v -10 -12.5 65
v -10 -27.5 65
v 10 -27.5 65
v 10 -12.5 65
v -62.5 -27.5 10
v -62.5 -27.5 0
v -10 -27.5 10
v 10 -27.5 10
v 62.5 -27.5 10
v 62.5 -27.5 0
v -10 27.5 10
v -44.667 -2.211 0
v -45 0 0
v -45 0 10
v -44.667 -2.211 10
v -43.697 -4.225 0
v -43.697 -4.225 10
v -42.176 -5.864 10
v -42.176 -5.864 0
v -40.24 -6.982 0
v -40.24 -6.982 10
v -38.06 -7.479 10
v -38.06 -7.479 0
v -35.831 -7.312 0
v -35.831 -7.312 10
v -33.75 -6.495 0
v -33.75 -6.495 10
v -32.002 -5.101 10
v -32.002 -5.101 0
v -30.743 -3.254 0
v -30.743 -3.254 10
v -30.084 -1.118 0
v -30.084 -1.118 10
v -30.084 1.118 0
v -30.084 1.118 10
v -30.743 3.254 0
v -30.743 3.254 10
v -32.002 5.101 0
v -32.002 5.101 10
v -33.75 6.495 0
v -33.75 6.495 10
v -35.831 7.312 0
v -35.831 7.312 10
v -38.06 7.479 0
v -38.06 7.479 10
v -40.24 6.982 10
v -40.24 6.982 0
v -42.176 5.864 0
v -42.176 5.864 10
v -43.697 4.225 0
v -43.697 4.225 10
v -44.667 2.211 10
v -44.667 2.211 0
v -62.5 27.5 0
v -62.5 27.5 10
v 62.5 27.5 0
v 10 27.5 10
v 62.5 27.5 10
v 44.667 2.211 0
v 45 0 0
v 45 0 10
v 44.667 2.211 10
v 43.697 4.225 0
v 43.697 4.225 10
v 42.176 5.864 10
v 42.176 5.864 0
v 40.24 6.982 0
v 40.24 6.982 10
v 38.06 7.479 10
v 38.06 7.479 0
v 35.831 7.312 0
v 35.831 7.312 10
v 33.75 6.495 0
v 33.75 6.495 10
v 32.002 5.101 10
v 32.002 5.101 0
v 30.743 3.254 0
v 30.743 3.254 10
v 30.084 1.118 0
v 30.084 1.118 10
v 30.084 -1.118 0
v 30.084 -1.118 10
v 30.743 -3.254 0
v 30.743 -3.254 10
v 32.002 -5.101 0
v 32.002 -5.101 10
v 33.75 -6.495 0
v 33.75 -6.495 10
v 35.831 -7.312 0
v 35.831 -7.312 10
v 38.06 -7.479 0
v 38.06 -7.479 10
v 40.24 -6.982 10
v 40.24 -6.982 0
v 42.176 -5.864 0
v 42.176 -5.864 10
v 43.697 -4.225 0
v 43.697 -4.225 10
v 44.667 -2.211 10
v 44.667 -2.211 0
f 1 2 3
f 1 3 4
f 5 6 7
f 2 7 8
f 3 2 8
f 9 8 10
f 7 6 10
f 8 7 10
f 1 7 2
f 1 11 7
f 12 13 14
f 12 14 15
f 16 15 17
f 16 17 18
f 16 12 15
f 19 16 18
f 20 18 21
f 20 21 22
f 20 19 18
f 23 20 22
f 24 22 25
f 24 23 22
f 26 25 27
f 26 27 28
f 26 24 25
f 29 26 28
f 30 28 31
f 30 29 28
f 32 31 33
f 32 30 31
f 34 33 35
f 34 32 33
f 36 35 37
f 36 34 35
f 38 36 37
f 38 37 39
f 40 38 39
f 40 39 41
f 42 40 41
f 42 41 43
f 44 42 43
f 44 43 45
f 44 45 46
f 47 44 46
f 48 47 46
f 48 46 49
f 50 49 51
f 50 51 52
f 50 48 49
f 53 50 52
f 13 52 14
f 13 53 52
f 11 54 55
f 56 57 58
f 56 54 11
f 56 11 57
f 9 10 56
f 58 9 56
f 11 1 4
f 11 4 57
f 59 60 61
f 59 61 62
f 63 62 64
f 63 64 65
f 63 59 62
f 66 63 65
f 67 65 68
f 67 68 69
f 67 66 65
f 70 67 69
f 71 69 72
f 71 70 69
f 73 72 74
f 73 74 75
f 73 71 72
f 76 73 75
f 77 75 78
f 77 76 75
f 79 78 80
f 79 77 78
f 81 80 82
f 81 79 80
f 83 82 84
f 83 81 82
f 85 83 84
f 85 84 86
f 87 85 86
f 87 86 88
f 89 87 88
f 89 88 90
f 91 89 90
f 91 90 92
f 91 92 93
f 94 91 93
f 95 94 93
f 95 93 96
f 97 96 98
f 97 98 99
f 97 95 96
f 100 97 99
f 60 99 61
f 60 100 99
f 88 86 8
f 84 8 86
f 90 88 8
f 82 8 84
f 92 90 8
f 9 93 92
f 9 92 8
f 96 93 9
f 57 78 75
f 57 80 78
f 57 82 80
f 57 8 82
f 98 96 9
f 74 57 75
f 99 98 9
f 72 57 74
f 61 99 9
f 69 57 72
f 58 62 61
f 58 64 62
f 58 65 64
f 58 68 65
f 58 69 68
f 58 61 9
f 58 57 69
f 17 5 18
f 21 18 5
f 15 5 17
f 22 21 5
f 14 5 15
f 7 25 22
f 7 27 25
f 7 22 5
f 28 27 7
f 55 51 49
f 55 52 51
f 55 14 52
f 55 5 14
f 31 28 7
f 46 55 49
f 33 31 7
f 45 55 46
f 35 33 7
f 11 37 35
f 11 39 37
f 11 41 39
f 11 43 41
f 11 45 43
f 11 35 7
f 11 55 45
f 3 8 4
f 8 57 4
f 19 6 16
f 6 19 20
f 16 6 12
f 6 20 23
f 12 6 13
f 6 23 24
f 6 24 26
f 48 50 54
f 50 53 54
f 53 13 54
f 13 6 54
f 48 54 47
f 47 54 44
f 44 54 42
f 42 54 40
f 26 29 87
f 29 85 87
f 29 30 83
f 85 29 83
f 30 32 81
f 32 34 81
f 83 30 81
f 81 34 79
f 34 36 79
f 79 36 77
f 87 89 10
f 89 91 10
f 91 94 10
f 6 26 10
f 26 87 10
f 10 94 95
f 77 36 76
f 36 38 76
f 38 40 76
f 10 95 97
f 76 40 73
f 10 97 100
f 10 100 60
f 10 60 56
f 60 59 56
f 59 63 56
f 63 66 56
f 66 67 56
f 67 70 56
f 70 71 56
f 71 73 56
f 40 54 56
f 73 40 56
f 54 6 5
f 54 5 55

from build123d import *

# Parameters (mm, degrees)
SKETCH1_W                = 125
SKETCH1_H                = 55
SKETCH1_R                = 7.5
BOSS_EXTRUDE1_DEPTH      = 10
BOSS_EXTRUDE2_DEPTH      = 10
BOSS_EXTRUDE2_DEPTH_BACK = 10


with BuildPart() as part:
    # Sketch1 → Boss-Extrude1 (new body)
    with BuildSketch(Plane.XY):
        Rectangle(SKETCH1_W, SKETCH1_H)
        with Locations((37.5, 0)):
            Circle(SKETCH1_R, mode=Mode.SUBTRACT)
        with Locations(Location((-37.5, 0, 0), (0, 0, 180))):
            Circle(SKETCH1_R, mode=Mode.SUBTRACT)
    extrude(amount=BOSS_EXTRUDE1_DEPTH)

    # Sketch2 → Boss-Extrude2 (add, two sides: drawn at the far end of the back side and taken through both)
    with BuildSketch(Plane(origin=(0, 0, 0), x_dir=(0, 0, -1), z_dir=(1, 0, 0)).offset(-BOSS_EXTRUDE2_DEPTH_BACK)):
        Polygon((-10, -27.5), (-65, -27.5), (-65, -12.5), (-10, 27.5), align=None)
    extrude(amount=BOSS_EXTRUDE2_DEPTH + BOSS_EXTRUDE2_DEPTH_BACK)


solid = part.part
